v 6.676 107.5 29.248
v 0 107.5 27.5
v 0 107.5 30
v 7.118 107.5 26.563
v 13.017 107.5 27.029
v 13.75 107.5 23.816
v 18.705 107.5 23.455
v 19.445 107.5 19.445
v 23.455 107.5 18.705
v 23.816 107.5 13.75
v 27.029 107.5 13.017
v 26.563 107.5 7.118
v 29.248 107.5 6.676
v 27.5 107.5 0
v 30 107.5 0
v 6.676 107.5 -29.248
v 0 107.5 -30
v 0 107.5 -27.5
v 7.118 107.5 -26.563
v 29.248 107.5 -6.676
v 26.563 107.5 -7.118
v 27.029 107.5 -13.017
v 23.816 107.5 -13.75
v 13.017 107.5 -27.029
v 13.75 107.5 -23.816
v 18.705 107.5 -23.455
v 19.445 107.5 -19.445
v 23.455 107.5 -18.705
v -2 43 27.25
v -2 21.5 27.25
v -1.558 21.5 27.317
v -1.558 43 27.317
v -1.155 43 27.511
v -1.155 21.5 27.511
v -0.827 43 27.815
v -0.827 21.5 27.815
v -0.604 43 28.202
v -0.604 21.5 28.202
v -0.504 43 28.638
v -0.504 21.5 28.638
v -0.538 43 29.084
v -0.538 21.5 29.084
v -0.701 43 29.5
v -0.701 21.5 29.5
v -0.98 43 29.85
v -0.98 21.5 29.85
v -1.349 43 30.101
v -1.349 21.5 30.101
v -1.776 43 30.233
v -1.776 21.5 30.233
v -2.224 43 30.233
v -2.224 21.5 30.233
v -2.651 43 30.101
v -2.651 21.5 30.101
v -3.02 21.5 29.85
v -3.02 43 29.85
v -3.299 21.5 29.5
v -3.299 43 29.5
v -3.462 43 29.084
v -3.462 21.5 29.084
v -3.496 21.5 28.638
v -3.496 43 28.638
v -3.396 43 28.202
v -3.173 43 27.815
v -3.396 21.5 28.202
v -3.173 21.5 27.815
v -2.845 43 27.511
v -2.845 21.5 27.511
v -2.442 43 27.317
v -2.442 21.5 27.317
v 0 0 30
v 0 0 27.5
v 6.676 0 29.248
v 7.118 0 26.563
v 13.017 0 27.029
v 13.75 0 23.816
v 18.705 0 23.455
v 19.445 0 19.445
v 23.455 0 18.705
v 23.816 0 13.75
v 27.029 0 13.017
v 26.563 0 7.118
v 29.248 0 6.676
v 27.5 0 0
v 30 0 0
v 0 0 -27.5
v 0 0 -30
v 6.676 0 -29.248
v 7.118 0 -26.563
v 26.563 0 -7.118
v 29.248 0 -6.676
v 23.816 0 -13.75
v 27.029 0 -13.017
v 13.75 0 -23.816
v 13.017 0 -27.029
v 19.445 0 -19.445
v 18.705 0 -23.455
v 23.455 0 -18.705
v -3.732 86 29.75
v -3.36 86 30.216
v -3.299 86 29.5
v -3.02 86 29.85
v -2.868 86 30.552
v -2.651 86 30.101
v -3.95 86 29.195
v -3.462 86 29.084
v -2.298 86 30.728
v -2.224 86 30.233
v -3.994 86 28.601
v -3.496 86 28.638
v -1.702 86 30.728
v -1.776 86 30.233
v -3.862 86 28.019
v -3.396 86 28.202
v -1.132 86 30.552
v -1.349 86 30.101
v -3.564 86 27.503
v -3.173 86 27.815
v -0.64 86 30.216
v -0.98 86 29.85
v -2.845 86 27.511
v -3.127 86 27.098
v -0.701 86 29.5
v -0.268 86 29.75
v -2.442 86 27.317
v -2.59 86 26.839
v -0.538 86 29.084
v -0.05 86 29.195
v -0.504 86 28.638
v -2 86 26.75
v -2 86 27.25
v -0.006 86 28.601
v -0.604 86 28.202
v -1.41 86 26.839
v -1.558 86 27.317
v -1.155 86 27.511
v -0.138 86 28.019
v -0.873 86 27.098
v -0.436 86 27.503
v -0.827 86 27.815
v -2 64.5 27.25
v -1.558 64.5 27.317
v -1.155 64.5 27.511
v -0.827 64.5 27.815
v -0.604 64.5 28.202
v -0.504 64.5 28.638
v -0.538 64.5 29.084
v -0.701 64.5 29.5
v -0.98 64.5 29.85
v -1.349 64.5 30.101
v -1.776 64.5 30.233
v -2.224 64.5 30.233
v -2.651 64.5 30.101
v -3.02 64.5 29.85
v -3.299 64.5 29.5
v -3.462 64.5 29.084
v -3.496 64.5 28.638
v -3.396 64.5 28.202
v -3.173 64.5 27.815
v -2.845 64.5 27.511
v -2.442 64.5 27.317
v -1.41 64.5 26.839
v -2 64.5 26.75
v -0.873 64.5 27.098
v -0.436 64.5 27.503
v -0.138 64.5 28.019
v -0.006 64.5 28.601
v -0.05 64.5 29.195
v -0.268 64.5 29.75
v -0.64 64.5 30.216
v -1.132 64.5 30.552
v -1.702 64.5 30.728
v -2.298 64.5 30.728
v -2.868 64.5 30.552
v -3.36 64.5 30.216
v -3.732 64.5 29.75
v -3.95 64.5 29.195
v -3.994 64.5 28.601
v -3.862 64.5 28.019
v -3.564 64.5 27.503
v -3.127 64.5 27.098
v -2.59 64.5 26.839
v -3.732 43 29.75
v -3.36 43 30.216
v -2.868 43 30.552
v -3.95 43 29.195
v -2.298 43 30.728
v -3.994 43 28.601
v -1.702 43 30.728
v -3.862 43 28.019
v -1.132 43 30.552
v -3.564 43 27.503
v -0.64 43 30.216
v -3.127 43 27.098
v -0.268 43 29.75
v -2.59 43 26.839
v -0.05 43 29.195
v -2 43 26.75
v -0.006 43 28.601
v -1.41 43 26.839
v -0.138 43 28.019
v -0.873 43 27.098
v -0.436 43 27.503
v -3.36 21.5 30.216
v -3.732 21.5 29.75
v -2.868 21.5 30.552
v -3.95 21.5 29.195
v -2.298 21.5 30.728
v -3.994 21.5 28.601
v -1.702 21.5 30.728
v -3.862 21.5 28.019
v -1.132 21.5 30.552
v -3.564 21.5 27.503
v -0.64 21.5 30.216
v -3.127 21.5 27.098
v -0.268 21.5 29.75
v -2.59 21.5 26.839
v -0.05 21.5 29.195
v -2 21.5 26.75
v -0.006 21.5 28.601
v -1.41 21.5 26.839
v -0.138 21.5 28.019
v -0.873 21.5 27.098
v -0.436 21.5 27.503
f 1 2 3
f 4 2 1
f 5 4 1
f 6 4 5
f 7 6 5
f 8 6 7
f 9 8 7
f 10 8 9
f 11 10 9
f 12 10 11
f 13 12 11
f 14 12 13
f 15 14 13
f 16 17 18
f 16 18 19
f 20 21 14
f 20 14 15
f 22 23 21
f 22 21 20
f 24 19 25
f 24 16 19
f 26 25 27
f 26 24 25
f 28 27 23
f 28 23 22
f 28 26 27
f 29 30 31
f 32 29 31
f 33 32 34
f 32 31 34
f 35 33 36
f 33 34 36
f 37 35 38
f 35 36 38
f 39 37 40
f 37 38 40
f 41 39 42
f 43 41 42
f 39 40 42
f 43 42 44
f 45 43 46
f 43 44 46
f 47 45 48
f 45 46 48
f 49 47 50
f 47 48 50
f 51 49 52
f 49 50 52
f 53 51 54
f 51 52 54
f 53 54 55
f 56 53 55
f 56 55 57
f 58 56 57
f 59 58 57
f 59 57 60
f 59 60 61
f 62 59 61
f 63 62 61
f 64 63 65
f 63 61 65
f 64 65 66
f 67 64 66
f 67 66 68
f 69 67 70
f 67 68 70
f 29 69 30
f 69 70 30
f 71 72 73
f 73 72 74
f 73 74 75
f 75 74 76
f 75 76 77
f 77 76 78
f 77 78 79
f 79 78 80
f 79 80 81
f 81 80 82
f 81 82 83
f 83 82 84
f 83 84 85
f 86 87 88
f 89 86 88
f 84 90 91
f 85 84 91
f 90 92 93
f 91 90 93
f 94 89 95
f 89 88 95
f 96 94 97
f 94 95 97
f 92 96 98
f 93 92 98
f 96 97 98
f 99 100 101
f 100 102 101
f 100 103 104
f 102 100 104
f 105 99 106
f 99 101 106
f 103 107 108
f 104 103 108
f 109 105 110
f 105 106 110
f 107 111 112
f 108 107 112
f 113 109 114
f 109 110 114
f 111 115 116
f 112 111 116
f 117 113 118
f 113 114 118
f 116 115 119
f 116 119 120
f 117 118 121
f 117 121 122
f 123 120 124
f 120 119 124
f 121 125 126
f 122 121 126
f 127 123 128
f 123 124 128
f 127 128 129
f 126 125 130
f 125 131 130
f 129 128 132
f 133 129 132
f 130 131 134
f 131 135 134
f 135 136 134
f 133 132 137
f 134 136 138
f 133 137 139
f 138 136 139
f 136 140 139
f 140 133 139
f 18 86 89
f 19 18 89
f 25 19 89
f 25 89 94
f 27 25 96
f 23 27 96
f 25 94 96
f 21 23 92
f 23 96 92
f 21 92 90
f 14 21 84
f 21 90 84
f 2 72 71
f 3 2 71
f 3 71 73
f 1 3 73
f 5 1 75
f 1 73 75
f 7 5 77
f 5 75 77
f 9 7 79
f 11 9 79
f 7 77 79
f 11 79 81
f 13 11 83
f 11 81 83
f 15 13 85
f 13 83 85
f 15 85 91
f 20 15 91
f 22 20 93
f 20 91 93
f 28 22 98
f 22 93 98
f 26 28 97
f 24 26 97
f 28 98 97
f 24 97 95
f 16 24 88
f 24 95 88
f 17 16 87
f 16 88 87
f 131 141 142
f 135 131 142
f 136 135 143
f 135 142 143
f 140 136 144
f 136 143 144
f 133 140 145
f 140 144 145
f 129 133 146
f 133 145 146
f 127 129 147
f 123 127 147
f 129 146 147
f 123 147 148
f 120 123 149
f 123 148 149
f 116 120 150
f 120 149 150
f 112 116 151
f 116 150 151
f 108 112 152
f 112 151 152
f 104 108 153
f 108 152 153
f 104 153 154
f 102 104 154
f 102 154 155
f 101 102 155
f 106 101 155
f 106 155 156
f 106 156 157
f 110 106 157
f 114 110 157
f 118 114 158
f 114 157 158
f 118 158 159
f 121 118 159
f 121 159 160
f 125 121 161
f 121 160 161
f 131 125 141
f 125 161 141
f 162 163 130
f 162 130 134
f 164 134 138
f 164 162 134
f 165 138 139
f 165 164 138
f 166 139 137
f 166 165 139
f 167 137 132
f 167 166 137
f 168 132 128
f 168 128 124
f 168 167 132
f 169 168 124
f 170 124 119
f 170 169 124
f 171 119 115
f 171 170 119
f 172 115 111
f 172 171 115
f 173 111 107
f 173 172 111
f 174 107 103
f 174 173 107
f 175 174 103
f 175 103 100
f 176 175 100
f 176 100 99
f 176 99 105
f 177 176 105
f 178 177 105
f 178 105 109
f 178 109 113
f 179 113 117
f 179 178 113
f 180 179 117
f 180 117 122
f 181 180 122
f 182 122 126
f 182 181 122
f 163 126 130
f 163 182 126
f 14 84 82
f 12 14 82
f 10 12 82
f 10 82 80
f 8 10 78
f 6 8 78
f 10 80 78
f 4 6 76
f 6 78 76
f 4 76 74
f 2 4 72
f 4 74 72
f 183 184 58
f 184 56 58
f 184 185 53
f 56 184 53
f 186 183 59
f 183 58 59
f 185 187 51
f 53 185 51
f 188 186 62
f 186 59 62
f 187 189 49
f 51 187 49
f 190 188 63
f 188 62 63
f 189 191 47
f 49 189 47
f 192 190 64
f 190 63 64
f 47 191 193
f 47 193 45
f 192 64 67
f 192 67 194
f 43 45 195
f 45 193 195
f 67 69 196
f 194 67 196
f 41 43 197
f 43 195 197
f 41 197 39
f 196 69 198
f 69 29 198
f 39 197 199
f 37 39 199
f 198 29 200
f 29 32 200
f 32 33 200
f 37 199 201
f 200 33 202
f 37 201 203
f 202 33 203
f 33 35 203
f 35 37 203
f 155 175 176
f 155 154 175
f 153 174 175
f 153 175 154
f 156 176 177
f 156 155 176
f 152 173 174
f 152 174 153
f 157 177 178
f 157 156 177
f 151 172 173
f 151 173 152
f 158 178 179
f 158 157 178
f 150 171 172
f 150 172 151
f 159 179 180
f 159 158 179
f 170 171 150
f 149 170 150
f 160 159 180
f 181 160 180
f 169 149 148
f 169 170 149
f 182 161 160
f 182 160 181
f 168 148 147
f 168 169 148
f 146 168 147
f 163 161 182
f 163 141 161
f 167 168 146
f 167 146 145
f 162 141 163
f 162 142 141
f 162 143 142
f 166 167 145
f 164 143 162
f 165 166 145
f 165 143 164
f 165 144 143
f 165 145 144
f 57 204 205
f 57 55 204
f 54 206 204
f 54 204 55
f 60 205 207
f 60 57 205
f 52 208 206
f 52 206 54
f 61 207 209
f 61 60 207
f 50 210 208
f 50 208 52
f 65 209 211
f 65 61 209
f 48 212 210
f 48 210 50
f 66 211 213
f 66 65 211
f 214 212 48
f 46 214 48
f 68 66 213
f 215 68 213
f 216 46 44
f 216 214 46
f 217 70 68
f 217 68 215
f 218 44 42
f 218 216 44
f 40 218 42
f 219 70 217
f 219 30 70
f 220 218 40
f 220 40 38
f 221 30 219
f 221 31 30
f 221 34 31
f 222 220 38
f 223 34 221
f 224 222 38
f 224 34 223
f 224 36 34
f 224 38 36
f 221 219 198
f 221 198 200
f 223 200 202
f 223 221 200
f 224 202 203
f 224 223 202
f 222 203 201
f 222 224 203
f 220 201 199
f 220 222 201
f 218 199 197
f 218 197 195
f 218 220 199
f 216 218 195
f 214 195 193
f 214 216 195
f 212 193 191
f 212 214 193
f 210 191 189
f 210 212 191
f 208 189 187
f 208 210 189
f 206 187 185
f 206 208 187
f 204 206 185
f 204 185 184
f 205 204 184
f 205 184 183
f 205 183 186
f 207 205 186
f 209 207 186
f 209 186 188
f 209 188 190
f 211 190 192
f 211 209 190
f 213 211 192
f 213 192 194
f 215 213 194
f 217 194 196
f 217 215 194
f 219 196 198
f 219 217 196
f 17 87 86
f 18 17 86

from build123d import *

# Parameters (mm, degrees)
BOSS_EXTRUDE1_DEPTH = 107.5
BOSS_EXTRUDE2_START = -21.5
SKETCH2_R           = 2
SKETCH2_R_2         = 1.5
BOSS_EXTRUDE2_DEPTH = 21.5
LPATTERN1_COUNT     = 2
LPATTERN1_PITCH     = 43


with BuildPart() as part:
    # Sketch1 → Boss-Extrude1 (new body)
    with BuildSketch(Plane(origin=(0, 0, 0), x_dir=(1, 0, 0), z_dir=(0, 1, 0))):
        with BuildLine():
            ThreePointArc((30, 0), (21.213203436, 21.213203436), (0, 30))
            Line((0, 30), (0, 27.5))
            ThreePointArc((0, 27.5), (19.445436483, 19.445436483), (27.5, 0))
            ThreePointArc((27.5, 0), (19.445436483, -19.445436483), (0, -27.5))
            Line((0, -27.5), (0, -30))
            ThreePointArc((0, -30), (21.213203436, -21.213203436), (30, 0))
        make_face()
    extrude(amount=BOSS_EXTRUDE1_DEPTH)


with BuildPart() as body_2:
    # Sketch2 → Boss-Extrude2 (new body)
    with BuildSketch(Plane.XZ.offset(BOSS_EXTRUDE2_START)):
        with Locations(Location((-2, 28.75, 0), (0, 0, 270))):
            Circle(SKETCH2_R)
        with Locations(Location((-2, 28.75, 0), (0, 0, 270))):
            Circle(SKETCH2_R_2, mode=Mode.SUBTRACT)
    boss_extrude2 = extrude(amount=-BOSS_EXTRUDE2_DEPTH)


with BuildPart() as lpattern1_1:
    # LPattern1: Boss-Extrude2 ×2
    with Locations(*[(0, i * LPATTERN1_PITCH, 0) for i in range(1, LPATTERN1_COUNT)]):
        add(boss_extrude2)


solid = Compound([part.part, body_2.part, lpattern1_1.part])
